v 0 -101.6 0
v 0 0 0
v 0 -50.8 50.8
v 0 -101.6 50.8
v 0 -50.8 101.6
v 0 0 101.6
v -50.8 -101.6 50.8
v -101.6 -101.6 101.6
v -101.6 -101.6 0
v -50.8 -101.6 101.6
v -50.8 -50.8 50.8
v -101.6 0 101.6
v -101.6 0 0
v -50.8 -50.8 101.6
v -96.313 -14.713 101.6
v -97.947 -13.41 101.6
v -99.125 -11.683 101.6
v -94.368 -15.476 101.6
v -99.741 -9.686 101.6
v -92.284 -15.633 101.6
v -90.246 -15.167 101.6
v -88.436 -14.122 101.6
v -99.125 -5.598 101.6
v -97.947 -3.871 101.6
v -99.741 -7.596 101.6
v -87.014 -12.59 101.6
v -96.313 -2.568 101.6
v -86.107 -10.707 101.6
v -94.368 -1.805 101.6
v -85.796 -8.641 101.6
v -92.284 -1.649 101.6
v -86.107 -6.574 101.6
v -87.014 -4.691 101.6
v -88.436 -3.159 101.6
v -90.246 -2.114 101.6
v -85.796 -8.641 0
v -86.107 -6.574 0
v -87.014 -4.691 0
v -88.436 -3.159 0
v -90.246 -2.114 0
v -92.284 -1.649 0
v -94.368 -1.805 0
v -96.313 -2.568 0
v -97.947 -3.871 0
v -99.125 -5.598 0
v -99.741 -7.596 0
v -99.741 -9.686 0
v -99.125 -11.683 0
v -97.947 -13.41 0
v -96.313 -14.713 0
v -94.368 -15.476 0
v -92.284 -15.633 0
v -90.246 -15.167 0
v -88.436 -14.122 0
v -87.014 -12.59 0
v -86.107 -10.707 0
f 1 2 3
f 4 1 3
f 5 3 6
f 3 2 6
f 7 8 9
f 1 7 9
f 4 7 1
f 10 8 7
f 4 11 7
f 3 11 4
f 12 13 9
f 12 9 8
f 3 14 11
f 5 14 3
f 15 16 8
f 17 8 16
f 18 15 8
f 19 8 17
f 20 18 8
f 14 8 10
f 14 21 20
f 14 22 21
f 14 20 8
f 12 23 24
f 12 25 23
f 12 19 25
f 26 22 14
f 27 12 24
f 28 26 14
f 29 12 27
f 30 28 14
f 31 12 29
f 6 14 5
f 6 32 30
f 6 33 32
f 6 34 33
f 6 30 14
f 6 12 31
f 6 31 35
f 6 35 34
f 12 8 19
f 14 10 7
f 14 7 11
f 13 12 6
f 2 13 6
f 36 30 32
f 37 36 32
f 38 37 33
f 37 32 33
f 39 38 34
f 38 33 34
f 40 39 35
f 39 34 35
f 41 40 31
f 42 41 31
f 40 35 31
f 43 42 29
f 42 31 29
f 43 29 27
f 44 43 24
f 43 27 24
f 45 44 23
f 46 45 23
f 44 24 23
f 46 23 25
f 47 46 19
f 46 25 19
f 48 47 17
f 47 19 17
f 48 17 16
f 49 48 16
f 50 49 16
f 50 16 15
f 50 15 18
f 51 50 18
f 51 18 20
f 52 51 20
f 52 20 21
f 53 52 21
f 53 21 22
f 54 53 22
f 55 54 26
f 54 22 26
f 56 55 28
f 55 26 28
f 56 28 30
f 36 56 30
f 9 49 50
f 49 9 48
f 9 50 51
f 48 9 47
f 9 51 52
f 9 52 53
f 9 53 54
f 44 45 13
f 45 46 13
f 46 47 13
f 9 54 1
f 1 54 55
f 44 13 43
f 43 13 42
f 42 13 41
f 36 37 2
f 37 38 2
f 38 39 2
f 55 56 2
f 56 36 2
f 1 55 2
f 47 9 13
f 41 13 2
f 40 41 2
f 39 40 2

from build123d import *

# Parameters (mm, degrees)
F0_W     = 101.6
F0_H     = 101.6
F1_DEPTH = 101.6
F2_R     = 7.011592
F3_DEPTH = 101.6
F4_W     = 50.8
F4_H     = 50.8
F5_DEPTH = 50.8


with BuildPart() as f1:
    # F0 (on Front) → F1 (new body)
    with BuildSketch(Plane.XZ):
        with Locations((-50.8, 50.8)):
            Rectangle(F0_W, F0_H)
    extrude(amount=F1_DEPTH)

    # F2 (on face) → F3 (cut)
    with BuildSketch(Plane.XY.offset(101.6)):
        with Locations((-92.807561, -8.640565)):
            Circle(F2_R)
    extrude(amount=-F3_DEPTH, mode=Mode.SUBTRACT)

    # F4 (on face) → F5 (cut)
    with BuildSketch(Plane.XY.offset(101.6)):
        with Locations((-25.4, -76.2)):
            Rectangle(F4_W, F4_H)
    extrude(amount=-F5_DEPTH, mode=Mode.SUBTRACT)


solid = f1.part
